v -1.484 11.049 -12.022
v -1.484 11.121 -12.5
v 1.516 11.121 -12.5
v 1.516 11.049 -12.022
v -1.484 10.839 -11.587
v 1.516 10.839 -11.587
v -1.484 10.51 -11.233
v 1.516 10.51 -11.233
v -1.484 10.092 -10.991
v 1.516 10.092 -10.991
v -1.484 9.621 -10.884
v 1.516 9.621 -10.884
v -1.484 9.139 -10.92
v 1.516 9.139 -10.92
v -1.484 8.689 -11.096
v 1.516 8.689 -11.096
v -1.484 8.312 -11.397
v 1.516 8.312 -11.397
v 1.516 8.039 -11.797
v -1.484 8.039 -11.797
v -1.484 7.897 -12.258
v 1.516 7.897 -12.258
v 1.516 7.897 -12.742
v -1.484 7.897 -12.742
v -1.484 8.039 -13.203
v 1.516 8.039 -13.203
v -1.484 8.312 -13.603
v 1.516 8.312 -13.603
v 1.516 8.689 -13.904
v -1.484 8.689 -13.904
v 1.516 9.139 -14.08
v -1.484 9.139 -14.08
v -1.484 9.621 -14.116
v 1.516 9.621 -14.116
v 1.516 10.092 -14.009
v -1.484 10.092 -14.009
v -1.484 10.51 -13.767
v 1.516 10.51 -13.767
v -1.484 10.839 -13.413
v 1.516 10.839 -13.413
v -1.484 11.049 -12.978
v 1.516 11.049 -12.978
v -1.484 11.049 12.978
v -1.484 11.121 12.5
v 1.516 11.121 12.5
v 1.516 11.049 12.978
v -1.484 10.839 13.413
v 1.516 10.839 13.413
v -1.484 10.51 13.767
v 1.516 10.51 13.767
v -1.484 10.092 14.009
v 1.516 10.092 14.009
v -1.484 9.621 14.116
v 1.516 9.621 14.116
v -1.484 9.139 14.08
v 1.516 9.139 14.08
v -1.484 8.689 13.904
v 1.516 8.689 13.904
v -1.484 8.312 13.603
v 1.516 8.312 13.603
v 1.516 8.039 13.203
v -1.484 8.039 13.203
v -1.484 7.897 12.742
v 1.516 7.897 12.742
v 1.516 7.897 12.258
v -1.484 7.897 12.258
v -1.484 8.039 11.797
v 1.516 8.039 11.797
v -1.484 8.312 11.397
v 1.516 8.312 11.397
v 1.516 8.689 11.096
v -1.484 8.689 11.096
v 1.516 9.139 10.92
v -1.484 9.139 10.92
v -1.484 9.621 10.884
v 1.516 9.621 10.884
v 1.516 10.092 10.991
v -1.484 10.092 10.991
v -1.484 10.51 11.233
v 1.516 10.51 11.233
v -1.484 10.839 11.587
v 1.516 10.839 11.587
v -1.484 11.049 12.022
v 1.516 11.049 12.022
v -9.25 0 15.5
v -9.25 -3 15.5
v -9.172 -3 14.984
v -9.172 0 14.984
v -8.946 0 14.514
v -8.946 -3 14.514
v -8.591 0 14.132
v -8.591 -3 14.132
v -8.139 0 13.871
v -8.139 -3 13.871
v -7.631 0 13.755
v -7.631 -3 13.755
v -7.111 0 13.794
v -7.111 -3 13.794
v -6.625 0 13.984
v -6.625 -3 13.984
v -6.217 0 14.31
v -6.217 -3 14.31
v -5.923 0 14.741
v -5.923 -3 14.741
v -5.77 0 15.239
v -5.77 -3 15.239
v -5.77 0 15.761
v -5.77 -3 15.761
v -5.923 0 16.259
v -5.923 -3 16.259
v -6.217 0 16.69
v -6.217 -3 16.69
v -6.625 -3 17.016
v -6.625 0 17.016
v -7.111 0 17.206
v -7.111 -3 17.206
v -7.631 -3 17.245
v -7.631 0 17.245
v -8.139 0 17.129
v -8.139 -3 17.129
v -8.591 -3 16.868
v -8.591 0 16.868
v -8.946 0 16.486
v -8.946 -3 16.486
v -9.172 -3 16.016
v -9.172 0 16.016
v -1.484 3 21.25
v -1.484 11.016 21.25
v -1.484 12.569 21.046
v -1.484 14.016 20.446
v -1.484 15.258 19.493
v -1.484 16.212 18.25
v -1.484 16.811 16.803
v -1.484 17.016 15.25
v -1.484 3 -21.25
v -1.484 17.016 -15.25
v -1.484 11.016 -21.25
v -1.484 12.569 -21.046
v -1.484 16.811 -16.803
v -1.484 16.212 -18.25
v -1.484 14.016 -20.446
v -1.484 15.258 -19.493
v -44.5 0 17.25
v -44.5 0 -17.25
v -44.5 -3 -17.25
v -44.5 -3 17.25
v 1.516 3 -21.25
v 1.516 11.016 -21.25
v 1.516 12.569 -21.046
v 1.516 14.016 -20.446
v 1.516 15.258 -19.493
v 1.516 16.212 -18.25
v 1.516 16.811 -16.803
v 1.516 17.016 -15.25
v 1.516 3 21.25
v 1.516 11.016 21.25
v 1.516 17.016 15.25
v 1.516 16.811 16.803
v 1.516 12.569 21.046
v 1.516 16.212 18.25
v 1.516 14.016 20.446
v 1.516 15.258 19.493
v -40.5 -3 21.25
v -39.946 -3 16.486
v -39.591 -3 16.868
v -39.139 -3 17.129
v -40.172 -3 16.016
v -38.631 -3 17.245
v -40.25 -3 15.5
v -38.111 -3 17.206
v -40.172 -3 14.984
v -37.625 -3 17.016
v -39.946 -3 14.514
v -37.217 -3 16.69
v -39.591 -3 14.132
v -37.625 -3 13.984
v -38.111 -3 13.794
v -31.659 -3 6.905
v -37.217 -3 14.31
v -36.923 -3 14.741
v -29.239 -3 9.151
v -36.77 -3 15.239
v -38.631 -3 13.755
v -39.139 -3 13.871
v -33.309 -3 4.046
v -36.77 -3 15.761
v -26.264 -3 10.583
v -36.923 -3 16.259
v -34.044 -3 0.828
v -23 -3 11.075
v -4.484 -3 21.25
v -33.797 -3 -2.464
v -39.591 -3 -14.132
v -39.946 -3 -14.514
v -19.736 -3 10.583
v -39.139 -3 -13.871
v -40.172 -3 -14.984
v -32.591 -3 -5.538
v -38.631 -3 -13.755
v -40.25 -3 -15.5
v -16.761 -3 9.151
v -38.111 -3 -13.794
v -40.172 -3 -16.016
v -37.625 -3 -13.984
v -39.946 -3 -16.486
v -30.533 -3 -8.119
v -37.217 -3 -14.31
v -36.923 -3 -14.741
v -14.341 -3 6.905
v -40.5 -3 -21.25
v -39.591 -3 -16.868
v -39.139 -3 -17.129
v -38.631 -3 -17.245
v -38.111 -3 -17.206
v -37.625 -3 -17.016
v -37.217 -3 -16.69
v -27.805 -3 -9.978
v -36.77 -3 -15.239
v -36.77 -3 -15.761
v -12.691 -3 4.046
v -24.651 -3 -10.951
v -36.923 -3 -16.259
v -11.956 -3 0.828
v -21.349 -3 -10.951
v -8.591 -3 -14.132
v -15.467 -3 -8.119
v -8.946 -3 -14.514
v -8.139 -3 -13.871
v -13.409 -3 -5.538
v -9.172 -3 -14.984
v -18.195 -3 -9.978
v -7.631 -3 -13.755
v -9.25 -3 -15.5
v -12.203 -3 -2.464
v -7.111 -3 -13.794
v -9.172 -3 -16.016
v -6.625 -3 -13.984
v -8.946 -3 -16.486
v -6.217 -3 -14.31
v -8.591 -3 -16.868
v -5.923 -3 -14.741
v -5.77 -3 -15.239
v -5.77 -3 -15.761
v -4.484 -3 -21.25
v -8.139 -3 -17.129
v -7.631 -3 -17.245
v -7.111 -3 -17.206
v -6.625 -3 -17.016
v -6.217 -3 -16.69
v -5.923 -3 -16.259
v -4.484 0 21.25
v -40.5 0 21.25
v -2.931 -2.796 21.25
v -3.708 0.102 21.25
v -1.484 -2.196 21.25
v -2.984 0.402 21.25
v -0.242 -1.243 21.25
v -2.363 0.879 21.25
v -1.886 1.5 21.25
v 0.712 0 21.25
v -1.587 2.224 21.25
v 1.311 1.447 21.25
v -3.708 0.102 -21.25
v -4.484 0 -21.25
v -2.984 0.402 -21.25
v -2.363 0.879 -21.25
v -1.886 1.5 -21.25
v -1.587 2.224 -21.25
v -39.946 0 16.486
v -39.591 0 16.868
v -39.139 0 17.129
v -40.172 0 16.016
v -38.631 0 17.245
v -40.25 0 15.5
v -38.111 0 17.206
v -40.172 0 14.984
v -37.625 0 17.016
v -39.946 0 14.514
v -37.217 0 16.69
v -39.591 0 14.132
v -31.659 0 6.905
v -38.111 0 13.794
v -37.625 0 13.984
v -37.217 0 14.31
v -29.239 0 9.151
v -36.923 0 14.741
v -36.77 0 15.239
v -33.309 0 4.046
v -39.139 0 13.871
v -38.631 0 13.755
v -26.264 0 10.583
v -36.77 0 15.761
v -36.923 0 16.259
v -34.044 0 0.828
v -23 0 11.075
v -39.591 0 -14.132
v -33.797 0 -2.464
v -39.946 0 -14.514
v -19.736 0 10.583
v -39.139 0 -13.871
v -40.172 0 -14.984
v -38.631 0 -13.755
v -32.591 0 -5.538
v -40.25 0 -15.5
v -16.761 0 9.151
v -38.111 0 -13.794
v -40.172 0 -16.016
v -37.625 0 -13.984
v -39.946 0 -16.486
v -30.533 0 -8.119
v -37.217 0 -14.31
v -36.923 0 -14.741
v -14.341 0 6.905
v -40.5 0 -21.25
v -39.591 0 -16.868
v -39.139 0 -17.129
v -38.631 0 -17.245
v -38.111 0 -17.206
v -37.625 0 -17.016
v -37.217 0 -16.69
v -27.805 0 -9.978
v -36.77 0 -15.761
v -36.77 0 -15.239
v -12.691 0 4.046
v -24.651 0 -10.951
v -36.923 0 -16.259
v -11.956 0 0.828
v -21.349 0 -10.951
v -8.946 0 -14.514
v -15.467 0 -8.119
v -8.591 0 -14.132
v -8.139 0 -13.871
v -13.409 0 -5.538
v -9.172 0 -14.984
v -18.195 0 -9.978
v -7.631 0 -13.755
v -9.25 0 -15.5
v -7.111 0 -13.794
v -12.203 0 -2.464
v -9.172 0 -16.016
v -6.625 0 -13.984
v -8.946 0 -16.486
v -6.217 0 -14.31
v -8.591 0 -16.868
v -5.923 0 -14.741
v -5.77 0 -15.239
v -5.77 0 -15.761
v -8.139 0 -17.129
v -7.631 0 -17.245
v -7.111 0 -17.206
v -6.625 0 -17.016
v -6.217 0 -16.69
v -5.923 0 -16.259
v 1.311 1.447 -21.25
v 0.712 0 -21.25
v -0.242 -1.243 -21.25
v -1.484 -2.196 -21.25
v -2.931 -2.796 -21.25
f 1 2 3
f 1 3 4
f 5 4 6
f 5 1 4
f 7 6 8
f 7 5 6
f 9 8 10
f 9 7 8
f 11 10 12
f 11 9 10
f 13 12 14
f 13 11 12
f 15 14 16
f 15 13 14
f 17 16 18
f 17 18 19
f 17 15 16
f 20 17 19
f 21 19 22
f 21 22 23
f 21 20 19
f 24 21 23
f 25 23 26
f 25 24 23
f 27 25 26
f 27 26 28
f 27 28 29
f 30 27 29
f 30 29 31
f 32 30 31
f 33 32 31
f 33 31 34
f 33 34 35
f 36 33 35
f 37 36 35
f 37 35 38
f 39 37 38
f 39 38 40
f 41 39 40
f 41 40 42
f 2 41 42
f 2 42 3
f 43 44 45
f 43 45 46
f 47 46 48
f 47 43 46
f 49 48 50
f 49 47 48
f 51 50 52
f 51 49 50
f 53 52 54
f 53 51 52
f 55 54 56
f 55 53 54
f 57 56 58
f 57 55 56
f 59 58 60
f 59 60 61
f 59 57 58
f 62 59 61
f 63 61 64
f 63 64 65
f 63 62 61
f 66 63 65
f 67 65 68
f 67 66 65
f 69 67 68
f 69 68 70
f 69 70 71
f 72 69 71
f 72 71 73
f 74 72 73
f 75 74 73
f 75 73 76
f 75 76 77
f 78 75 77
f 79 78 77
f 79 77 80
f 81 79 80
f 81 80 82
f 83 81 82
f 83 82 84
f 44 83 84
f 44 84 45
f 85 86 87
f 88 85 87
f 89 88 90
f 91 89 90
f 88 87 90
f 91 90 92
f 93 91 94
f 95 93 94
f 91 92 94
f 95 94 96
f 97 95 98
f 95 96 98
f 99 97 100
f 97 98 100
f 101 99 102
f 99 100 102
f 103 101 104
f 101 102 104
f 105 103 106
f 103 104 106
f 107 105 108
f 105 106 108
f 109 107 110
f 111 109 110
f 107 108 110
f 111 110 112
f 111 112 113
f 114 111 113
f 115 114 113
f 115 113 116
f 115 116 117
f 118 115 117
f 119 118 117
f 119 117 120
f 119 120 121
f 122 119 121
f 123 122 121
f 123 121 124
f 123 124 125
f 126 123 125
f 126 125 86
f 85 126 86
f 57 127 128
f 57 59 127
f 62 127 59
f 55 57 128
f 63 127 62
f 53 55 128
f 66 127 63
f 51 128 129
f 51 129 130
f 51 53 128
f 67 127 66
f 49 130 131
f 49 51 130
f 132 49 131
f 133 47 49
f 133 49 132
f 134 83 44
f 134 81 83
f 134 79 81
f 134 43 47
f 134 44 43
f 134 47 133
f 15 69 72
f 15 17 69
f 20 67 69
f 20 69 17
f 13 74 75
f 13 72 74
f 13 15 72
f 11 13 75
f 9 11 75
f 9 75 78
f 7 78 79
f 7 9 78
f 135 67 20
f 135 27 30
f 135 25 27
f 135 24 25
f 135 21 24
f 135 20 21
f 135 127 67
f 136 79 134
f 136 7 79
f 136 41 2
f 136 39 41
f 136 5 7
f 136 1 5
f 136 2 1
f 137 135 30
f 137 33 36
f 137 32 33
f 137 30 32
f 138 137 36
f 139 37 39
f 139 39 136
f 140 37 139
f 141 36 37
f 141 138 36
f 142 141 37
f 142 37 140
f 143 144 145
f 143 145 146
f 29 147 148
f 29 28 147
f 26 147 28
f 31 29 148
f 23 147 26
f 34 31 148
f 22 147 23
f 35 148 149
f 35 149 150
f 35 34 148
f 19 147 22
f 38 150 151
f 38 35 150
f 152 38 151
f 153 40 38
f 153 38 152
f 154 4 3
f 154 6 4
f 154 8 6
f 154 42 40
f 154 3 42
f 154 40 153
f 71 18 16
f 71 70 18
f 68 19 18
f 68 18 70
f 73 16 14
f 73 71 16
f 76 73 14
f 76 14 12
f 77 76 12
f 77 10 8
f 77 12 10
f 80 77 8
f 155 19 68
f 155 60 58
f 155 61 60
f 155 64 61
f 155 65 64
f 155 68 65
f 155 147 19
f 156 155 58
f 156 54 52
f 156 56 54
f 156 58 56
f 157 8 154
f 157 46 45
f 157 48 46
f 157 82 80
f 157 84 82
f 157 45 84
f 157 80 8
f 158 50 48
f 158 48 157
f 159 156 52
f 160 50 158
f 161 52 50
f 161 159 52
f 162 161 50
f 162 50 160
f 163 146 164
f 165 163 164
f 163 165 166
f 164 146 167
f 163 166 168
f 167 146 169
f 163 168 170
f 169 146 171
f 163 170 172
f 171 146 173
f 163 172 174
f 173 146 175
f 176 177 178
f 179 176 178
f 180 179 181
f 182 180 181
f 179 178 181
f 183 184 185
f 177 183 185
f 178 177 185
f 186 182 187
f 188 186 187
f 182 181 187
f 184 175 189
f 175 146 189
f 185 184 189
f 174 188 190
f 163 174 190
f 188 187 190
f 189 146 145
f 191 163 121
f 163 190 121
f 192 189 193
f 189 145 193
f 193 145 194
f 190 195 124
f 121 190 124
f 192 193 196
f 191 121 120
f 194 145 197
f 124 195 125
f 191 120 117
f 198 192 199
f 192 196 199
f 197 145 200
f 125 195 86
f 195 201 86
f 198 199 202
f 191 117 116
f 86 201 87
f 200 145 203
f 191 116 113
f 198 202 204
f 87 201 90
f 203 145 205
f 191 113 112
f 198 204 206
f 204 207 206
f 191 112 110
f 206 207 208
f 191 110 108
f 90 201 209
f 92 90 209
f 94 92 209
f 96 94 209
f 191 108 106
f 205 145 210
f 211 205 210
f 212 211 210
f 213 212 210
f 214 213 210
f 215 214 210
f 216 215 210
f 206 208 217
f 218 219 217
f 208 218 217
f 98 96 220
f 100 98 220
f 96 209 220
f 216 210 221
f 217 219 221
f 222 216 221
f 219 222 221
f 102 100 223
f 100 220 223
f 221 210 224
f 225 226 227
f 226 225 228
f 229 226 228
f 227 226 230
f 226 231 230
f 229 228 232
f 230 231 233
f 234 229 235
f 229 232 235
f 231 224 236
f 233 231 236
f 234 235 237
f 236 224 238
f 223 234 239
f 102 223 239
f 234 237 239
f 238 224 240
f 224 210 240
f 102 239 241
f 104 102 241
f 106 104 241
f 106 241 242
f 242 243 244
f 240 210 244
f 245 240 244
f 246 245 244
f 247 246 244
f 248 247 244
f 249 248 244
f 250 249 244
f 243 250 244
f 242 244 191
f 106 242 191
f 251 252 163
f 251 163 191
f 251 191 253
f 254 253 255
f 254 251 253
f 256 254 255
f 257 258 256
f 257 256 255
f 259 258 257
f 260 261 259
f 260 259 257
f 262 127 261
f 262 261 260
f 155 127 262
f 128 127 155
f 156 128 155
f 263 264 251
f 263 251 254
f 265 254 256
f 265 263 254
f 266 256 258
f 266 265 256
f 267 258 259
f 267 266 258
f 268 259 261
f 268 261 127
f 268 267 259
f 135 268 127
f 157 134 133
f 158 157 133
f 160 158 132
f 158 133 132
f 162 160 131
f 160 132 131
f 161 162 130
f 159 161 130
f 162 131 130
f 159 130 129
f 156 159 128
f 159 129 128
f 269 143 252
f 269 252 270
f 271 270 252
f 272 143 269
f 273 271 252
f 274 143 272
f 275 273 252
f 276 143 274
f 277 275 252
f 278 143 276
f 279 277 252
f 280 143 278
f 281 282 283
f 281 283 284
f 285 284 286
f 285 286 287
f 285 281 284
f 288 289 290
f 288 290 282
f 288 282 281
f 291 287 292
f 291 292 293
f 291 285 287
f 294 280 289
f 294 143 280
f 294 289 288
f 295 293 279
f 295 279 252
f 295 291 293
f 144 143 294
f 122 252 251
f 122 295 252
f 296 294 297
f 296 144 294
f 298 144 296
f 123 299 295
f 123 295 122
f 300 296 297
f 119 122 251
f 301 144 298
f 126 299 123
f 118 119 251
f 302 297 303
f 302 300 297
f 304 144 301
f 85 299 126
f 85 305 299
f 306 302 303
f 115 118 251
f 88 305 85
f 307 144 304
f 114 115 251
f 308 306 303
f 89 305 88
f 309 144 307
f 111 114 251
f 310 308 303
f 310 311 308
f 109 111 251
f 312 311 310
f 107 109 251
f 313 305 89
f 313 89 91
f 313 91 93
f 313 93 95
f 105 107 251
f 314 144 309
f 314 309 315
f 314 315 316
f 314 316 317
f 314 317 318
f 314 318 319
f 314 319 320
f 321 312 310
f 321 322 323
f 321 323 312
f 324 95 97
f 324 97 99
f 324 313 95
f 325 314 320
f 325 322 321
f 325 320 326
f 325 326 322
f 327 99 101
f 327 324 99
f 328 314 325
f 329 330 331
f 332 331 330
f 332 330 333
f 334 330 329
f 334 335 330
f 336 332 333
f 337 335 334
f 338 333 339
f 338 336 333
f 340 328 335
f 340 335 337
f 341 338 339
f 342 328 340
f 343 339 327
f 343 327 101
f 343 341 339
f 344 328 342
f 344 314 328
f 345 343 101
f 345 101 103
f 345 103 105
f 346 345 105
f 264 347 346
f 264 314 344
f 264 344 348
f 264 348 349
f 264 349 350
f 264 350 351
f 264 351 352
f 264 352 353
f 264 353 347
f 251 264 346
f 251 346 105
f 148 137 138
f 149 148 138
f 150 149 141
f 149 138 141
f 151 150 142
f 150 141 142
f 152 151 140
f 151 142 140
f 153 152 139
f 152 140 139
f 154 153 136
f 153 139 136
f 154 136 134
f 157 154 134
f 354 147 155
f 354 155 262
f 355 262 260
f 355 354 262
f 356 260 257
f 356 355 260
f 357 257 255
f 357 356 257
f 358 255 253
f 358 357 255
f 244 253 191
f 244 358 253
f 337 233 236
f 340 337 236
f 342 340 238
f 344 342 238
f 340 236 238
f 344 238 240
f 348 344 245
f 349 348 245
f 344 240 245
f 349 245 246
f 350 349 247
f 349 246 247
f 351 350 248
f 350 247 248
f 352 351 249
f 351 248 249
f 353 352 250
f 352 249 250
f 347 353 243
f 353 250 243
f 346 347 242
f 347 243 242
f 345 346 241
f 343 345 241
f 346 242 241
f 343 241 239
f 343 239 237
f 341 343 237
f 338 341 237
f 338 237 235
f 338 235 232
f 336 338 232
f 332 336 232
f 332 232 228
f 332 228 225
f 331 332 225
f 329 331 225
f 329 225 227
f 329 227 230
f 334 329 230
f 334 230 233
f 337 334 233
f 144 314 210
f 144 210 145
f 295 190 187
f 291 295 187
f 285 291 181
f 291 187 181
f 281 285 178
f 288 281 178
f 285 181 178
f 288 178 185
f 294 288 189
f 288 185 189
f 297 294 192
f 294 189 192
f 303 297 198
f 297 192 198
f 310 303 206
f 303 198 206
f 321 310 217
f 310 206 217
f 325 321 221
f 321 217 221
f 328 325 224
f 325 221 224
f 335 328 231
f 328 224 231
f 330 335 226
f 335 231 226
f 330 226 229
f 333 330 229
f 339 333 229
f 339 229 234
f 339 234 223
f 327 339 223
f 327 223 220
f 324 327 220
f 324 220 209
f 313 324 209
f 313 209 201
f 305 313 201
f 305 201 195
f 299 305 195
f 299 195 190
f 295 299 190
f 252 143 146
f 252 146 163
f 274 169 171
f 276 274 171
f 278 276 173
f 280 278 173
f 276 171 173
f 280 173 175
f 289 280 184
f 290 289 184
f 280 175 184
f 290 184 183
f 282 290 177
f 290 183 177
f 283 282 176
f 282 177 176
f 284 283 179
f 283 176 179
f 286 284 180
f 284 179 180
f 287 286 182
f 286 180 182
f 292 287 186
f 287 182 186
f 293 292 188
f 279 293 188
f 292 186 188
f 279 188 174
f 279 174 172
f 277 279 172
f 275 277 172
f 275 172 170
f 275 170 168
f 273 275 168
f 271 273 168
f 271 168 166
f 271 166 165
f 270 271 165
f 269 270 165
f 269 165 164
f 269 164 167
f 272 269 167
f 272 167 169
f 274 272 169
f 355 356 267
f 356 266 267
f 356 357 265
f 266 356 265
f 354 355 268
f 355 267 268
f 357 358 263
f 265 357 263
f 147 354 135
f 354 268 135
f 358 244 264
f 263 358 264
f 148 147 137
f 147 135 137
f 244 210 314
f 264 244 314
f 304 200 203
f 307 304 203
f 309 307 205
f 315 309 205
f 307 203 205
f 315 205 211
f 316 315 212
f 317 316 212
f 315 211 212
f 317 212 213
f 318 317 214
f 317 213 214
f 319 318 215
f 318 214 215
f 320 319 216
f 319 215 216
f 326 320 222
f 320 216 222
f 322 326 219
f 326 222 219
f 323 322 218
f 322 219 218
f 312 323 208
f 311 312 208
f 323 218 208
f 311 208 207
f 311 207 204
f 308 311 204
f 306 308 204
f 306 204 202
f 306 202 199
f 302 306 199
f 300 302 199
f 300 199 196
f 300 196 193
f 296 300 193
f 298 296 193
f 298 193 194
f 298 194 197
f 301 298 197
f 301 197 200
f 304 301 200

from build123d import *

# Parameters (mm, degrees)
BOSS_EXTRUDE1_DEPTH        = 3
M3_CLEARANCE_HOLE1_D       = 3.242
F_3_5_3_5_DIAMETER_HOLE1_D = 3.5
SKETCH14_R                 = 11.075
CUT_EXTRUDE1_DEPTH         = 50.404579747
SKETCHED_START             = 0.899268265
SKETCHED_BEND1_OUTLINE_W   = 3
SKETCHED_BEND1_OUTLINE_H   = 42.5
SKETCHED_BEND1_DEPTH       = 15.700731735
SKETCHED_START_2           = -1.484291735
SKETCHED_BEND1_2_OUTLINE_R = 1.621
SKETCHED_BEND1_2_DEPTH     = 0.01644
SKETCHED_START_3           = -4.484291735
SKETCHED_BEND1_3_OUTLINE_R = 1.621
SKETCHED_BEND1_3_DEPTH     = 6
SKETCHED_START_4           = -21.25
SKETCHED_BEND1_4_DEPTH     = 42.5


with BuildPart() as part:
    # Sketch7 → Boss-Extrude1 (new body)
    with BuildSketch(Plane(origin=(0, 0, 0), x_dir=(1, 0, 0), z_dir=(0, 1, 0))):
        with BuildLine():
            Line((-40.5, -21.25), (10.6, -21.25))
            ThreePointArc((10.6, -21.25), (14.842640687, -19.492640687), (16.6, -15.25))
            Line((16.6, -15.25), (16.6, 15.25))
            ThreePointArc((16.6, 15.25), (14.842640687, 19.492640687), (10.6, 21.25))
            Line((10.6, 21.25), (-40.5, 21.25))
            Line((-40.5, 21.25), (-44.5, 17.25))
            Line((-44.5, 17.25), (-44.5, -17.25))
            Line((-44.5, -17.25), (-40.5, -21.25))
        make_face()
    extrude(amount=-BOSS_EXTRUDE1_DEPTH)

    # M3 Clearance Hole1 (through all)
    with Locations(Plane(origin=(0, -3, 0), x_dir=(-1, 0, 0), z_dir=(0, -1, 0))):
        with Locations((-9.084084573, -12.5), (-9.084084573, 12.5)):
            Hole(M3_CLEARANCE_HOLE1_D / 2)

    # Ø3.5 (3.5) Diameter Hole1 (through all)
    with Locations(Plane(origin=(0, 0, 0), x_dir=(1, 0, 0), z_dir=(0, 1, 0))):
        with Locations((-7.5, -15.5), (-38.5, -15.5), (-38.5, 15.5), (-7.5, 15.5)):
            Hole(F_3_5_3_5_DIAMETER_HOLE1_D / 2)

    # Sketch14 → Cut-Extrude1 (cut, through all)
    with BuildSketch(Plane.XZ.offset(3)):
        with Locations(Location((-23, 0, 0), (0, 0, 90))):
            Circle(SKETCH14_R)
    extrude(amount=-CUT_EXTRUDE1_DEPTH, mode=Mode.SUBTRACT)

    # Sketched Bend1: read off the stored shape, not the designer's step
    # Sketched Bend1 outline → Sketched Bend1 (cut)
    with BuildSketch(Plane.YZ.offset(SKETCHED_START)):
        with Locations((-1.5, 0)):
            Rectangle(SKETCHED_BEND1_OUTLINE_W, SKETCHED_BEND1_OUTLINE_H)
    extrude(amount=SKETCHED_BEND1_DEPTH, mode=Mode.SUBTRACT)

    # Sketched Bend1 2 outline → Sketched Bend1 2 (add)
    with BuildSketch(Plane.YZ.offset(SKETCHED_START_2)):
        with BuildLine():
            Line((0, -21.25), (11.015708265, -21.25))
            ThreePointArc((11.015708265, -21.25), (15.258348952, -19.492640687), (17.015708265, -15.25))
            Line((17.015708265, -15.25), (17.015708265, 15.25))
            ThreePointArc((17.015708265, 15.25), (15.258348952, 19.492640687), (11.015708265, 21.25))
            Line((11.015708265, 21.25), (0, 21.25))
            Line((0, 21.25), (0, -21.25))
        make_face()
        with Locations((9.499792838, -12.5)):
            Circle(SKETCHED_BEND1_2_OUTLINE_R, mode=Mode.SUBTRACT)
        with Locations((9.499792838, 12.5)):
            Circle(SKETCHED_BEND1_2_OUTLINE_R, mode=Mode.SUBTRACT)
    extrude(amount=SKETCHED_BEND1_2_DEPTH)

    # Sketched Bend1 3 outline → Sketched Bend1 3 (add)
    with BuildSketch(Plane.YZ.offset(SKETCHED_START_3)):
        with BuildLine():
            Line((0, -21.25), (11.015708265, -21.25))
            ThreePointArc((11.015708265, -21.25), (15.258348952, -19.492640687), (17.015708265, -15.25))
            Line((17.015708265, -15.25), (17.015708265, 15.25))
            ThreePointArc((17.015708265, 15.25), (15.258348952, 19.492640687), (11.015708265, 21.25))
            Line((11.015708265, 21.25), (0, 21.25))
            Line((0, 21.25), (0, -21.25))
        make_face()
        with Locations((9.499792838, -12.5)):
            Circle(SKETCHED_BEND1_3_OUTLINE_R, mode=Mode.SUBTRACT)
        with Locations((9.499792838, 12.5)):
            Circle(SKETCHED_BEND1_3_OUTLINE_R, mode=Mode.SUBTRACT)
    extrude(amount=SKETCHED_BEND1_3_DEPTH)

    # Sketched Bend1 4 outline → Sketched Bend1 4 (cut)
    with BuildSketch(Plane.XY.offset(SKETCHED_START_4)):
        with BuildLine():
            Line((-1.484291735, 3), (-1.484291735, 17.015708265))
            Line((-1.484291735, 17.015708265), (-4.484291735, 17.015708265))
            Line((-4.484291735, 17.015708265), (-4.484291735, 0))
            ThreePointArc((-4.484291735, 0), (-2.362971392, 0.878679656), (-1.484291735, 3))
        make_face()
        with BuildLine():
            Line((1.515708265, 0), (1.515708265, 3))
            ThreePointArc((1.515708265, 3), (-0.241651048, -1.242640687), (-4.484291735, -3))
            Line((-4.484291735, -3), (0.899268265, -3))
            Line((0.899268265, -3), (0.899268265, 0))
            Line((0.899268265, 0), (1.515708265, 0))
        make_face()
    extrude(amount=SKETCHED_BEND1_4_DEPTH, mode=Mode.SUBTRACT)


solid = part.part
